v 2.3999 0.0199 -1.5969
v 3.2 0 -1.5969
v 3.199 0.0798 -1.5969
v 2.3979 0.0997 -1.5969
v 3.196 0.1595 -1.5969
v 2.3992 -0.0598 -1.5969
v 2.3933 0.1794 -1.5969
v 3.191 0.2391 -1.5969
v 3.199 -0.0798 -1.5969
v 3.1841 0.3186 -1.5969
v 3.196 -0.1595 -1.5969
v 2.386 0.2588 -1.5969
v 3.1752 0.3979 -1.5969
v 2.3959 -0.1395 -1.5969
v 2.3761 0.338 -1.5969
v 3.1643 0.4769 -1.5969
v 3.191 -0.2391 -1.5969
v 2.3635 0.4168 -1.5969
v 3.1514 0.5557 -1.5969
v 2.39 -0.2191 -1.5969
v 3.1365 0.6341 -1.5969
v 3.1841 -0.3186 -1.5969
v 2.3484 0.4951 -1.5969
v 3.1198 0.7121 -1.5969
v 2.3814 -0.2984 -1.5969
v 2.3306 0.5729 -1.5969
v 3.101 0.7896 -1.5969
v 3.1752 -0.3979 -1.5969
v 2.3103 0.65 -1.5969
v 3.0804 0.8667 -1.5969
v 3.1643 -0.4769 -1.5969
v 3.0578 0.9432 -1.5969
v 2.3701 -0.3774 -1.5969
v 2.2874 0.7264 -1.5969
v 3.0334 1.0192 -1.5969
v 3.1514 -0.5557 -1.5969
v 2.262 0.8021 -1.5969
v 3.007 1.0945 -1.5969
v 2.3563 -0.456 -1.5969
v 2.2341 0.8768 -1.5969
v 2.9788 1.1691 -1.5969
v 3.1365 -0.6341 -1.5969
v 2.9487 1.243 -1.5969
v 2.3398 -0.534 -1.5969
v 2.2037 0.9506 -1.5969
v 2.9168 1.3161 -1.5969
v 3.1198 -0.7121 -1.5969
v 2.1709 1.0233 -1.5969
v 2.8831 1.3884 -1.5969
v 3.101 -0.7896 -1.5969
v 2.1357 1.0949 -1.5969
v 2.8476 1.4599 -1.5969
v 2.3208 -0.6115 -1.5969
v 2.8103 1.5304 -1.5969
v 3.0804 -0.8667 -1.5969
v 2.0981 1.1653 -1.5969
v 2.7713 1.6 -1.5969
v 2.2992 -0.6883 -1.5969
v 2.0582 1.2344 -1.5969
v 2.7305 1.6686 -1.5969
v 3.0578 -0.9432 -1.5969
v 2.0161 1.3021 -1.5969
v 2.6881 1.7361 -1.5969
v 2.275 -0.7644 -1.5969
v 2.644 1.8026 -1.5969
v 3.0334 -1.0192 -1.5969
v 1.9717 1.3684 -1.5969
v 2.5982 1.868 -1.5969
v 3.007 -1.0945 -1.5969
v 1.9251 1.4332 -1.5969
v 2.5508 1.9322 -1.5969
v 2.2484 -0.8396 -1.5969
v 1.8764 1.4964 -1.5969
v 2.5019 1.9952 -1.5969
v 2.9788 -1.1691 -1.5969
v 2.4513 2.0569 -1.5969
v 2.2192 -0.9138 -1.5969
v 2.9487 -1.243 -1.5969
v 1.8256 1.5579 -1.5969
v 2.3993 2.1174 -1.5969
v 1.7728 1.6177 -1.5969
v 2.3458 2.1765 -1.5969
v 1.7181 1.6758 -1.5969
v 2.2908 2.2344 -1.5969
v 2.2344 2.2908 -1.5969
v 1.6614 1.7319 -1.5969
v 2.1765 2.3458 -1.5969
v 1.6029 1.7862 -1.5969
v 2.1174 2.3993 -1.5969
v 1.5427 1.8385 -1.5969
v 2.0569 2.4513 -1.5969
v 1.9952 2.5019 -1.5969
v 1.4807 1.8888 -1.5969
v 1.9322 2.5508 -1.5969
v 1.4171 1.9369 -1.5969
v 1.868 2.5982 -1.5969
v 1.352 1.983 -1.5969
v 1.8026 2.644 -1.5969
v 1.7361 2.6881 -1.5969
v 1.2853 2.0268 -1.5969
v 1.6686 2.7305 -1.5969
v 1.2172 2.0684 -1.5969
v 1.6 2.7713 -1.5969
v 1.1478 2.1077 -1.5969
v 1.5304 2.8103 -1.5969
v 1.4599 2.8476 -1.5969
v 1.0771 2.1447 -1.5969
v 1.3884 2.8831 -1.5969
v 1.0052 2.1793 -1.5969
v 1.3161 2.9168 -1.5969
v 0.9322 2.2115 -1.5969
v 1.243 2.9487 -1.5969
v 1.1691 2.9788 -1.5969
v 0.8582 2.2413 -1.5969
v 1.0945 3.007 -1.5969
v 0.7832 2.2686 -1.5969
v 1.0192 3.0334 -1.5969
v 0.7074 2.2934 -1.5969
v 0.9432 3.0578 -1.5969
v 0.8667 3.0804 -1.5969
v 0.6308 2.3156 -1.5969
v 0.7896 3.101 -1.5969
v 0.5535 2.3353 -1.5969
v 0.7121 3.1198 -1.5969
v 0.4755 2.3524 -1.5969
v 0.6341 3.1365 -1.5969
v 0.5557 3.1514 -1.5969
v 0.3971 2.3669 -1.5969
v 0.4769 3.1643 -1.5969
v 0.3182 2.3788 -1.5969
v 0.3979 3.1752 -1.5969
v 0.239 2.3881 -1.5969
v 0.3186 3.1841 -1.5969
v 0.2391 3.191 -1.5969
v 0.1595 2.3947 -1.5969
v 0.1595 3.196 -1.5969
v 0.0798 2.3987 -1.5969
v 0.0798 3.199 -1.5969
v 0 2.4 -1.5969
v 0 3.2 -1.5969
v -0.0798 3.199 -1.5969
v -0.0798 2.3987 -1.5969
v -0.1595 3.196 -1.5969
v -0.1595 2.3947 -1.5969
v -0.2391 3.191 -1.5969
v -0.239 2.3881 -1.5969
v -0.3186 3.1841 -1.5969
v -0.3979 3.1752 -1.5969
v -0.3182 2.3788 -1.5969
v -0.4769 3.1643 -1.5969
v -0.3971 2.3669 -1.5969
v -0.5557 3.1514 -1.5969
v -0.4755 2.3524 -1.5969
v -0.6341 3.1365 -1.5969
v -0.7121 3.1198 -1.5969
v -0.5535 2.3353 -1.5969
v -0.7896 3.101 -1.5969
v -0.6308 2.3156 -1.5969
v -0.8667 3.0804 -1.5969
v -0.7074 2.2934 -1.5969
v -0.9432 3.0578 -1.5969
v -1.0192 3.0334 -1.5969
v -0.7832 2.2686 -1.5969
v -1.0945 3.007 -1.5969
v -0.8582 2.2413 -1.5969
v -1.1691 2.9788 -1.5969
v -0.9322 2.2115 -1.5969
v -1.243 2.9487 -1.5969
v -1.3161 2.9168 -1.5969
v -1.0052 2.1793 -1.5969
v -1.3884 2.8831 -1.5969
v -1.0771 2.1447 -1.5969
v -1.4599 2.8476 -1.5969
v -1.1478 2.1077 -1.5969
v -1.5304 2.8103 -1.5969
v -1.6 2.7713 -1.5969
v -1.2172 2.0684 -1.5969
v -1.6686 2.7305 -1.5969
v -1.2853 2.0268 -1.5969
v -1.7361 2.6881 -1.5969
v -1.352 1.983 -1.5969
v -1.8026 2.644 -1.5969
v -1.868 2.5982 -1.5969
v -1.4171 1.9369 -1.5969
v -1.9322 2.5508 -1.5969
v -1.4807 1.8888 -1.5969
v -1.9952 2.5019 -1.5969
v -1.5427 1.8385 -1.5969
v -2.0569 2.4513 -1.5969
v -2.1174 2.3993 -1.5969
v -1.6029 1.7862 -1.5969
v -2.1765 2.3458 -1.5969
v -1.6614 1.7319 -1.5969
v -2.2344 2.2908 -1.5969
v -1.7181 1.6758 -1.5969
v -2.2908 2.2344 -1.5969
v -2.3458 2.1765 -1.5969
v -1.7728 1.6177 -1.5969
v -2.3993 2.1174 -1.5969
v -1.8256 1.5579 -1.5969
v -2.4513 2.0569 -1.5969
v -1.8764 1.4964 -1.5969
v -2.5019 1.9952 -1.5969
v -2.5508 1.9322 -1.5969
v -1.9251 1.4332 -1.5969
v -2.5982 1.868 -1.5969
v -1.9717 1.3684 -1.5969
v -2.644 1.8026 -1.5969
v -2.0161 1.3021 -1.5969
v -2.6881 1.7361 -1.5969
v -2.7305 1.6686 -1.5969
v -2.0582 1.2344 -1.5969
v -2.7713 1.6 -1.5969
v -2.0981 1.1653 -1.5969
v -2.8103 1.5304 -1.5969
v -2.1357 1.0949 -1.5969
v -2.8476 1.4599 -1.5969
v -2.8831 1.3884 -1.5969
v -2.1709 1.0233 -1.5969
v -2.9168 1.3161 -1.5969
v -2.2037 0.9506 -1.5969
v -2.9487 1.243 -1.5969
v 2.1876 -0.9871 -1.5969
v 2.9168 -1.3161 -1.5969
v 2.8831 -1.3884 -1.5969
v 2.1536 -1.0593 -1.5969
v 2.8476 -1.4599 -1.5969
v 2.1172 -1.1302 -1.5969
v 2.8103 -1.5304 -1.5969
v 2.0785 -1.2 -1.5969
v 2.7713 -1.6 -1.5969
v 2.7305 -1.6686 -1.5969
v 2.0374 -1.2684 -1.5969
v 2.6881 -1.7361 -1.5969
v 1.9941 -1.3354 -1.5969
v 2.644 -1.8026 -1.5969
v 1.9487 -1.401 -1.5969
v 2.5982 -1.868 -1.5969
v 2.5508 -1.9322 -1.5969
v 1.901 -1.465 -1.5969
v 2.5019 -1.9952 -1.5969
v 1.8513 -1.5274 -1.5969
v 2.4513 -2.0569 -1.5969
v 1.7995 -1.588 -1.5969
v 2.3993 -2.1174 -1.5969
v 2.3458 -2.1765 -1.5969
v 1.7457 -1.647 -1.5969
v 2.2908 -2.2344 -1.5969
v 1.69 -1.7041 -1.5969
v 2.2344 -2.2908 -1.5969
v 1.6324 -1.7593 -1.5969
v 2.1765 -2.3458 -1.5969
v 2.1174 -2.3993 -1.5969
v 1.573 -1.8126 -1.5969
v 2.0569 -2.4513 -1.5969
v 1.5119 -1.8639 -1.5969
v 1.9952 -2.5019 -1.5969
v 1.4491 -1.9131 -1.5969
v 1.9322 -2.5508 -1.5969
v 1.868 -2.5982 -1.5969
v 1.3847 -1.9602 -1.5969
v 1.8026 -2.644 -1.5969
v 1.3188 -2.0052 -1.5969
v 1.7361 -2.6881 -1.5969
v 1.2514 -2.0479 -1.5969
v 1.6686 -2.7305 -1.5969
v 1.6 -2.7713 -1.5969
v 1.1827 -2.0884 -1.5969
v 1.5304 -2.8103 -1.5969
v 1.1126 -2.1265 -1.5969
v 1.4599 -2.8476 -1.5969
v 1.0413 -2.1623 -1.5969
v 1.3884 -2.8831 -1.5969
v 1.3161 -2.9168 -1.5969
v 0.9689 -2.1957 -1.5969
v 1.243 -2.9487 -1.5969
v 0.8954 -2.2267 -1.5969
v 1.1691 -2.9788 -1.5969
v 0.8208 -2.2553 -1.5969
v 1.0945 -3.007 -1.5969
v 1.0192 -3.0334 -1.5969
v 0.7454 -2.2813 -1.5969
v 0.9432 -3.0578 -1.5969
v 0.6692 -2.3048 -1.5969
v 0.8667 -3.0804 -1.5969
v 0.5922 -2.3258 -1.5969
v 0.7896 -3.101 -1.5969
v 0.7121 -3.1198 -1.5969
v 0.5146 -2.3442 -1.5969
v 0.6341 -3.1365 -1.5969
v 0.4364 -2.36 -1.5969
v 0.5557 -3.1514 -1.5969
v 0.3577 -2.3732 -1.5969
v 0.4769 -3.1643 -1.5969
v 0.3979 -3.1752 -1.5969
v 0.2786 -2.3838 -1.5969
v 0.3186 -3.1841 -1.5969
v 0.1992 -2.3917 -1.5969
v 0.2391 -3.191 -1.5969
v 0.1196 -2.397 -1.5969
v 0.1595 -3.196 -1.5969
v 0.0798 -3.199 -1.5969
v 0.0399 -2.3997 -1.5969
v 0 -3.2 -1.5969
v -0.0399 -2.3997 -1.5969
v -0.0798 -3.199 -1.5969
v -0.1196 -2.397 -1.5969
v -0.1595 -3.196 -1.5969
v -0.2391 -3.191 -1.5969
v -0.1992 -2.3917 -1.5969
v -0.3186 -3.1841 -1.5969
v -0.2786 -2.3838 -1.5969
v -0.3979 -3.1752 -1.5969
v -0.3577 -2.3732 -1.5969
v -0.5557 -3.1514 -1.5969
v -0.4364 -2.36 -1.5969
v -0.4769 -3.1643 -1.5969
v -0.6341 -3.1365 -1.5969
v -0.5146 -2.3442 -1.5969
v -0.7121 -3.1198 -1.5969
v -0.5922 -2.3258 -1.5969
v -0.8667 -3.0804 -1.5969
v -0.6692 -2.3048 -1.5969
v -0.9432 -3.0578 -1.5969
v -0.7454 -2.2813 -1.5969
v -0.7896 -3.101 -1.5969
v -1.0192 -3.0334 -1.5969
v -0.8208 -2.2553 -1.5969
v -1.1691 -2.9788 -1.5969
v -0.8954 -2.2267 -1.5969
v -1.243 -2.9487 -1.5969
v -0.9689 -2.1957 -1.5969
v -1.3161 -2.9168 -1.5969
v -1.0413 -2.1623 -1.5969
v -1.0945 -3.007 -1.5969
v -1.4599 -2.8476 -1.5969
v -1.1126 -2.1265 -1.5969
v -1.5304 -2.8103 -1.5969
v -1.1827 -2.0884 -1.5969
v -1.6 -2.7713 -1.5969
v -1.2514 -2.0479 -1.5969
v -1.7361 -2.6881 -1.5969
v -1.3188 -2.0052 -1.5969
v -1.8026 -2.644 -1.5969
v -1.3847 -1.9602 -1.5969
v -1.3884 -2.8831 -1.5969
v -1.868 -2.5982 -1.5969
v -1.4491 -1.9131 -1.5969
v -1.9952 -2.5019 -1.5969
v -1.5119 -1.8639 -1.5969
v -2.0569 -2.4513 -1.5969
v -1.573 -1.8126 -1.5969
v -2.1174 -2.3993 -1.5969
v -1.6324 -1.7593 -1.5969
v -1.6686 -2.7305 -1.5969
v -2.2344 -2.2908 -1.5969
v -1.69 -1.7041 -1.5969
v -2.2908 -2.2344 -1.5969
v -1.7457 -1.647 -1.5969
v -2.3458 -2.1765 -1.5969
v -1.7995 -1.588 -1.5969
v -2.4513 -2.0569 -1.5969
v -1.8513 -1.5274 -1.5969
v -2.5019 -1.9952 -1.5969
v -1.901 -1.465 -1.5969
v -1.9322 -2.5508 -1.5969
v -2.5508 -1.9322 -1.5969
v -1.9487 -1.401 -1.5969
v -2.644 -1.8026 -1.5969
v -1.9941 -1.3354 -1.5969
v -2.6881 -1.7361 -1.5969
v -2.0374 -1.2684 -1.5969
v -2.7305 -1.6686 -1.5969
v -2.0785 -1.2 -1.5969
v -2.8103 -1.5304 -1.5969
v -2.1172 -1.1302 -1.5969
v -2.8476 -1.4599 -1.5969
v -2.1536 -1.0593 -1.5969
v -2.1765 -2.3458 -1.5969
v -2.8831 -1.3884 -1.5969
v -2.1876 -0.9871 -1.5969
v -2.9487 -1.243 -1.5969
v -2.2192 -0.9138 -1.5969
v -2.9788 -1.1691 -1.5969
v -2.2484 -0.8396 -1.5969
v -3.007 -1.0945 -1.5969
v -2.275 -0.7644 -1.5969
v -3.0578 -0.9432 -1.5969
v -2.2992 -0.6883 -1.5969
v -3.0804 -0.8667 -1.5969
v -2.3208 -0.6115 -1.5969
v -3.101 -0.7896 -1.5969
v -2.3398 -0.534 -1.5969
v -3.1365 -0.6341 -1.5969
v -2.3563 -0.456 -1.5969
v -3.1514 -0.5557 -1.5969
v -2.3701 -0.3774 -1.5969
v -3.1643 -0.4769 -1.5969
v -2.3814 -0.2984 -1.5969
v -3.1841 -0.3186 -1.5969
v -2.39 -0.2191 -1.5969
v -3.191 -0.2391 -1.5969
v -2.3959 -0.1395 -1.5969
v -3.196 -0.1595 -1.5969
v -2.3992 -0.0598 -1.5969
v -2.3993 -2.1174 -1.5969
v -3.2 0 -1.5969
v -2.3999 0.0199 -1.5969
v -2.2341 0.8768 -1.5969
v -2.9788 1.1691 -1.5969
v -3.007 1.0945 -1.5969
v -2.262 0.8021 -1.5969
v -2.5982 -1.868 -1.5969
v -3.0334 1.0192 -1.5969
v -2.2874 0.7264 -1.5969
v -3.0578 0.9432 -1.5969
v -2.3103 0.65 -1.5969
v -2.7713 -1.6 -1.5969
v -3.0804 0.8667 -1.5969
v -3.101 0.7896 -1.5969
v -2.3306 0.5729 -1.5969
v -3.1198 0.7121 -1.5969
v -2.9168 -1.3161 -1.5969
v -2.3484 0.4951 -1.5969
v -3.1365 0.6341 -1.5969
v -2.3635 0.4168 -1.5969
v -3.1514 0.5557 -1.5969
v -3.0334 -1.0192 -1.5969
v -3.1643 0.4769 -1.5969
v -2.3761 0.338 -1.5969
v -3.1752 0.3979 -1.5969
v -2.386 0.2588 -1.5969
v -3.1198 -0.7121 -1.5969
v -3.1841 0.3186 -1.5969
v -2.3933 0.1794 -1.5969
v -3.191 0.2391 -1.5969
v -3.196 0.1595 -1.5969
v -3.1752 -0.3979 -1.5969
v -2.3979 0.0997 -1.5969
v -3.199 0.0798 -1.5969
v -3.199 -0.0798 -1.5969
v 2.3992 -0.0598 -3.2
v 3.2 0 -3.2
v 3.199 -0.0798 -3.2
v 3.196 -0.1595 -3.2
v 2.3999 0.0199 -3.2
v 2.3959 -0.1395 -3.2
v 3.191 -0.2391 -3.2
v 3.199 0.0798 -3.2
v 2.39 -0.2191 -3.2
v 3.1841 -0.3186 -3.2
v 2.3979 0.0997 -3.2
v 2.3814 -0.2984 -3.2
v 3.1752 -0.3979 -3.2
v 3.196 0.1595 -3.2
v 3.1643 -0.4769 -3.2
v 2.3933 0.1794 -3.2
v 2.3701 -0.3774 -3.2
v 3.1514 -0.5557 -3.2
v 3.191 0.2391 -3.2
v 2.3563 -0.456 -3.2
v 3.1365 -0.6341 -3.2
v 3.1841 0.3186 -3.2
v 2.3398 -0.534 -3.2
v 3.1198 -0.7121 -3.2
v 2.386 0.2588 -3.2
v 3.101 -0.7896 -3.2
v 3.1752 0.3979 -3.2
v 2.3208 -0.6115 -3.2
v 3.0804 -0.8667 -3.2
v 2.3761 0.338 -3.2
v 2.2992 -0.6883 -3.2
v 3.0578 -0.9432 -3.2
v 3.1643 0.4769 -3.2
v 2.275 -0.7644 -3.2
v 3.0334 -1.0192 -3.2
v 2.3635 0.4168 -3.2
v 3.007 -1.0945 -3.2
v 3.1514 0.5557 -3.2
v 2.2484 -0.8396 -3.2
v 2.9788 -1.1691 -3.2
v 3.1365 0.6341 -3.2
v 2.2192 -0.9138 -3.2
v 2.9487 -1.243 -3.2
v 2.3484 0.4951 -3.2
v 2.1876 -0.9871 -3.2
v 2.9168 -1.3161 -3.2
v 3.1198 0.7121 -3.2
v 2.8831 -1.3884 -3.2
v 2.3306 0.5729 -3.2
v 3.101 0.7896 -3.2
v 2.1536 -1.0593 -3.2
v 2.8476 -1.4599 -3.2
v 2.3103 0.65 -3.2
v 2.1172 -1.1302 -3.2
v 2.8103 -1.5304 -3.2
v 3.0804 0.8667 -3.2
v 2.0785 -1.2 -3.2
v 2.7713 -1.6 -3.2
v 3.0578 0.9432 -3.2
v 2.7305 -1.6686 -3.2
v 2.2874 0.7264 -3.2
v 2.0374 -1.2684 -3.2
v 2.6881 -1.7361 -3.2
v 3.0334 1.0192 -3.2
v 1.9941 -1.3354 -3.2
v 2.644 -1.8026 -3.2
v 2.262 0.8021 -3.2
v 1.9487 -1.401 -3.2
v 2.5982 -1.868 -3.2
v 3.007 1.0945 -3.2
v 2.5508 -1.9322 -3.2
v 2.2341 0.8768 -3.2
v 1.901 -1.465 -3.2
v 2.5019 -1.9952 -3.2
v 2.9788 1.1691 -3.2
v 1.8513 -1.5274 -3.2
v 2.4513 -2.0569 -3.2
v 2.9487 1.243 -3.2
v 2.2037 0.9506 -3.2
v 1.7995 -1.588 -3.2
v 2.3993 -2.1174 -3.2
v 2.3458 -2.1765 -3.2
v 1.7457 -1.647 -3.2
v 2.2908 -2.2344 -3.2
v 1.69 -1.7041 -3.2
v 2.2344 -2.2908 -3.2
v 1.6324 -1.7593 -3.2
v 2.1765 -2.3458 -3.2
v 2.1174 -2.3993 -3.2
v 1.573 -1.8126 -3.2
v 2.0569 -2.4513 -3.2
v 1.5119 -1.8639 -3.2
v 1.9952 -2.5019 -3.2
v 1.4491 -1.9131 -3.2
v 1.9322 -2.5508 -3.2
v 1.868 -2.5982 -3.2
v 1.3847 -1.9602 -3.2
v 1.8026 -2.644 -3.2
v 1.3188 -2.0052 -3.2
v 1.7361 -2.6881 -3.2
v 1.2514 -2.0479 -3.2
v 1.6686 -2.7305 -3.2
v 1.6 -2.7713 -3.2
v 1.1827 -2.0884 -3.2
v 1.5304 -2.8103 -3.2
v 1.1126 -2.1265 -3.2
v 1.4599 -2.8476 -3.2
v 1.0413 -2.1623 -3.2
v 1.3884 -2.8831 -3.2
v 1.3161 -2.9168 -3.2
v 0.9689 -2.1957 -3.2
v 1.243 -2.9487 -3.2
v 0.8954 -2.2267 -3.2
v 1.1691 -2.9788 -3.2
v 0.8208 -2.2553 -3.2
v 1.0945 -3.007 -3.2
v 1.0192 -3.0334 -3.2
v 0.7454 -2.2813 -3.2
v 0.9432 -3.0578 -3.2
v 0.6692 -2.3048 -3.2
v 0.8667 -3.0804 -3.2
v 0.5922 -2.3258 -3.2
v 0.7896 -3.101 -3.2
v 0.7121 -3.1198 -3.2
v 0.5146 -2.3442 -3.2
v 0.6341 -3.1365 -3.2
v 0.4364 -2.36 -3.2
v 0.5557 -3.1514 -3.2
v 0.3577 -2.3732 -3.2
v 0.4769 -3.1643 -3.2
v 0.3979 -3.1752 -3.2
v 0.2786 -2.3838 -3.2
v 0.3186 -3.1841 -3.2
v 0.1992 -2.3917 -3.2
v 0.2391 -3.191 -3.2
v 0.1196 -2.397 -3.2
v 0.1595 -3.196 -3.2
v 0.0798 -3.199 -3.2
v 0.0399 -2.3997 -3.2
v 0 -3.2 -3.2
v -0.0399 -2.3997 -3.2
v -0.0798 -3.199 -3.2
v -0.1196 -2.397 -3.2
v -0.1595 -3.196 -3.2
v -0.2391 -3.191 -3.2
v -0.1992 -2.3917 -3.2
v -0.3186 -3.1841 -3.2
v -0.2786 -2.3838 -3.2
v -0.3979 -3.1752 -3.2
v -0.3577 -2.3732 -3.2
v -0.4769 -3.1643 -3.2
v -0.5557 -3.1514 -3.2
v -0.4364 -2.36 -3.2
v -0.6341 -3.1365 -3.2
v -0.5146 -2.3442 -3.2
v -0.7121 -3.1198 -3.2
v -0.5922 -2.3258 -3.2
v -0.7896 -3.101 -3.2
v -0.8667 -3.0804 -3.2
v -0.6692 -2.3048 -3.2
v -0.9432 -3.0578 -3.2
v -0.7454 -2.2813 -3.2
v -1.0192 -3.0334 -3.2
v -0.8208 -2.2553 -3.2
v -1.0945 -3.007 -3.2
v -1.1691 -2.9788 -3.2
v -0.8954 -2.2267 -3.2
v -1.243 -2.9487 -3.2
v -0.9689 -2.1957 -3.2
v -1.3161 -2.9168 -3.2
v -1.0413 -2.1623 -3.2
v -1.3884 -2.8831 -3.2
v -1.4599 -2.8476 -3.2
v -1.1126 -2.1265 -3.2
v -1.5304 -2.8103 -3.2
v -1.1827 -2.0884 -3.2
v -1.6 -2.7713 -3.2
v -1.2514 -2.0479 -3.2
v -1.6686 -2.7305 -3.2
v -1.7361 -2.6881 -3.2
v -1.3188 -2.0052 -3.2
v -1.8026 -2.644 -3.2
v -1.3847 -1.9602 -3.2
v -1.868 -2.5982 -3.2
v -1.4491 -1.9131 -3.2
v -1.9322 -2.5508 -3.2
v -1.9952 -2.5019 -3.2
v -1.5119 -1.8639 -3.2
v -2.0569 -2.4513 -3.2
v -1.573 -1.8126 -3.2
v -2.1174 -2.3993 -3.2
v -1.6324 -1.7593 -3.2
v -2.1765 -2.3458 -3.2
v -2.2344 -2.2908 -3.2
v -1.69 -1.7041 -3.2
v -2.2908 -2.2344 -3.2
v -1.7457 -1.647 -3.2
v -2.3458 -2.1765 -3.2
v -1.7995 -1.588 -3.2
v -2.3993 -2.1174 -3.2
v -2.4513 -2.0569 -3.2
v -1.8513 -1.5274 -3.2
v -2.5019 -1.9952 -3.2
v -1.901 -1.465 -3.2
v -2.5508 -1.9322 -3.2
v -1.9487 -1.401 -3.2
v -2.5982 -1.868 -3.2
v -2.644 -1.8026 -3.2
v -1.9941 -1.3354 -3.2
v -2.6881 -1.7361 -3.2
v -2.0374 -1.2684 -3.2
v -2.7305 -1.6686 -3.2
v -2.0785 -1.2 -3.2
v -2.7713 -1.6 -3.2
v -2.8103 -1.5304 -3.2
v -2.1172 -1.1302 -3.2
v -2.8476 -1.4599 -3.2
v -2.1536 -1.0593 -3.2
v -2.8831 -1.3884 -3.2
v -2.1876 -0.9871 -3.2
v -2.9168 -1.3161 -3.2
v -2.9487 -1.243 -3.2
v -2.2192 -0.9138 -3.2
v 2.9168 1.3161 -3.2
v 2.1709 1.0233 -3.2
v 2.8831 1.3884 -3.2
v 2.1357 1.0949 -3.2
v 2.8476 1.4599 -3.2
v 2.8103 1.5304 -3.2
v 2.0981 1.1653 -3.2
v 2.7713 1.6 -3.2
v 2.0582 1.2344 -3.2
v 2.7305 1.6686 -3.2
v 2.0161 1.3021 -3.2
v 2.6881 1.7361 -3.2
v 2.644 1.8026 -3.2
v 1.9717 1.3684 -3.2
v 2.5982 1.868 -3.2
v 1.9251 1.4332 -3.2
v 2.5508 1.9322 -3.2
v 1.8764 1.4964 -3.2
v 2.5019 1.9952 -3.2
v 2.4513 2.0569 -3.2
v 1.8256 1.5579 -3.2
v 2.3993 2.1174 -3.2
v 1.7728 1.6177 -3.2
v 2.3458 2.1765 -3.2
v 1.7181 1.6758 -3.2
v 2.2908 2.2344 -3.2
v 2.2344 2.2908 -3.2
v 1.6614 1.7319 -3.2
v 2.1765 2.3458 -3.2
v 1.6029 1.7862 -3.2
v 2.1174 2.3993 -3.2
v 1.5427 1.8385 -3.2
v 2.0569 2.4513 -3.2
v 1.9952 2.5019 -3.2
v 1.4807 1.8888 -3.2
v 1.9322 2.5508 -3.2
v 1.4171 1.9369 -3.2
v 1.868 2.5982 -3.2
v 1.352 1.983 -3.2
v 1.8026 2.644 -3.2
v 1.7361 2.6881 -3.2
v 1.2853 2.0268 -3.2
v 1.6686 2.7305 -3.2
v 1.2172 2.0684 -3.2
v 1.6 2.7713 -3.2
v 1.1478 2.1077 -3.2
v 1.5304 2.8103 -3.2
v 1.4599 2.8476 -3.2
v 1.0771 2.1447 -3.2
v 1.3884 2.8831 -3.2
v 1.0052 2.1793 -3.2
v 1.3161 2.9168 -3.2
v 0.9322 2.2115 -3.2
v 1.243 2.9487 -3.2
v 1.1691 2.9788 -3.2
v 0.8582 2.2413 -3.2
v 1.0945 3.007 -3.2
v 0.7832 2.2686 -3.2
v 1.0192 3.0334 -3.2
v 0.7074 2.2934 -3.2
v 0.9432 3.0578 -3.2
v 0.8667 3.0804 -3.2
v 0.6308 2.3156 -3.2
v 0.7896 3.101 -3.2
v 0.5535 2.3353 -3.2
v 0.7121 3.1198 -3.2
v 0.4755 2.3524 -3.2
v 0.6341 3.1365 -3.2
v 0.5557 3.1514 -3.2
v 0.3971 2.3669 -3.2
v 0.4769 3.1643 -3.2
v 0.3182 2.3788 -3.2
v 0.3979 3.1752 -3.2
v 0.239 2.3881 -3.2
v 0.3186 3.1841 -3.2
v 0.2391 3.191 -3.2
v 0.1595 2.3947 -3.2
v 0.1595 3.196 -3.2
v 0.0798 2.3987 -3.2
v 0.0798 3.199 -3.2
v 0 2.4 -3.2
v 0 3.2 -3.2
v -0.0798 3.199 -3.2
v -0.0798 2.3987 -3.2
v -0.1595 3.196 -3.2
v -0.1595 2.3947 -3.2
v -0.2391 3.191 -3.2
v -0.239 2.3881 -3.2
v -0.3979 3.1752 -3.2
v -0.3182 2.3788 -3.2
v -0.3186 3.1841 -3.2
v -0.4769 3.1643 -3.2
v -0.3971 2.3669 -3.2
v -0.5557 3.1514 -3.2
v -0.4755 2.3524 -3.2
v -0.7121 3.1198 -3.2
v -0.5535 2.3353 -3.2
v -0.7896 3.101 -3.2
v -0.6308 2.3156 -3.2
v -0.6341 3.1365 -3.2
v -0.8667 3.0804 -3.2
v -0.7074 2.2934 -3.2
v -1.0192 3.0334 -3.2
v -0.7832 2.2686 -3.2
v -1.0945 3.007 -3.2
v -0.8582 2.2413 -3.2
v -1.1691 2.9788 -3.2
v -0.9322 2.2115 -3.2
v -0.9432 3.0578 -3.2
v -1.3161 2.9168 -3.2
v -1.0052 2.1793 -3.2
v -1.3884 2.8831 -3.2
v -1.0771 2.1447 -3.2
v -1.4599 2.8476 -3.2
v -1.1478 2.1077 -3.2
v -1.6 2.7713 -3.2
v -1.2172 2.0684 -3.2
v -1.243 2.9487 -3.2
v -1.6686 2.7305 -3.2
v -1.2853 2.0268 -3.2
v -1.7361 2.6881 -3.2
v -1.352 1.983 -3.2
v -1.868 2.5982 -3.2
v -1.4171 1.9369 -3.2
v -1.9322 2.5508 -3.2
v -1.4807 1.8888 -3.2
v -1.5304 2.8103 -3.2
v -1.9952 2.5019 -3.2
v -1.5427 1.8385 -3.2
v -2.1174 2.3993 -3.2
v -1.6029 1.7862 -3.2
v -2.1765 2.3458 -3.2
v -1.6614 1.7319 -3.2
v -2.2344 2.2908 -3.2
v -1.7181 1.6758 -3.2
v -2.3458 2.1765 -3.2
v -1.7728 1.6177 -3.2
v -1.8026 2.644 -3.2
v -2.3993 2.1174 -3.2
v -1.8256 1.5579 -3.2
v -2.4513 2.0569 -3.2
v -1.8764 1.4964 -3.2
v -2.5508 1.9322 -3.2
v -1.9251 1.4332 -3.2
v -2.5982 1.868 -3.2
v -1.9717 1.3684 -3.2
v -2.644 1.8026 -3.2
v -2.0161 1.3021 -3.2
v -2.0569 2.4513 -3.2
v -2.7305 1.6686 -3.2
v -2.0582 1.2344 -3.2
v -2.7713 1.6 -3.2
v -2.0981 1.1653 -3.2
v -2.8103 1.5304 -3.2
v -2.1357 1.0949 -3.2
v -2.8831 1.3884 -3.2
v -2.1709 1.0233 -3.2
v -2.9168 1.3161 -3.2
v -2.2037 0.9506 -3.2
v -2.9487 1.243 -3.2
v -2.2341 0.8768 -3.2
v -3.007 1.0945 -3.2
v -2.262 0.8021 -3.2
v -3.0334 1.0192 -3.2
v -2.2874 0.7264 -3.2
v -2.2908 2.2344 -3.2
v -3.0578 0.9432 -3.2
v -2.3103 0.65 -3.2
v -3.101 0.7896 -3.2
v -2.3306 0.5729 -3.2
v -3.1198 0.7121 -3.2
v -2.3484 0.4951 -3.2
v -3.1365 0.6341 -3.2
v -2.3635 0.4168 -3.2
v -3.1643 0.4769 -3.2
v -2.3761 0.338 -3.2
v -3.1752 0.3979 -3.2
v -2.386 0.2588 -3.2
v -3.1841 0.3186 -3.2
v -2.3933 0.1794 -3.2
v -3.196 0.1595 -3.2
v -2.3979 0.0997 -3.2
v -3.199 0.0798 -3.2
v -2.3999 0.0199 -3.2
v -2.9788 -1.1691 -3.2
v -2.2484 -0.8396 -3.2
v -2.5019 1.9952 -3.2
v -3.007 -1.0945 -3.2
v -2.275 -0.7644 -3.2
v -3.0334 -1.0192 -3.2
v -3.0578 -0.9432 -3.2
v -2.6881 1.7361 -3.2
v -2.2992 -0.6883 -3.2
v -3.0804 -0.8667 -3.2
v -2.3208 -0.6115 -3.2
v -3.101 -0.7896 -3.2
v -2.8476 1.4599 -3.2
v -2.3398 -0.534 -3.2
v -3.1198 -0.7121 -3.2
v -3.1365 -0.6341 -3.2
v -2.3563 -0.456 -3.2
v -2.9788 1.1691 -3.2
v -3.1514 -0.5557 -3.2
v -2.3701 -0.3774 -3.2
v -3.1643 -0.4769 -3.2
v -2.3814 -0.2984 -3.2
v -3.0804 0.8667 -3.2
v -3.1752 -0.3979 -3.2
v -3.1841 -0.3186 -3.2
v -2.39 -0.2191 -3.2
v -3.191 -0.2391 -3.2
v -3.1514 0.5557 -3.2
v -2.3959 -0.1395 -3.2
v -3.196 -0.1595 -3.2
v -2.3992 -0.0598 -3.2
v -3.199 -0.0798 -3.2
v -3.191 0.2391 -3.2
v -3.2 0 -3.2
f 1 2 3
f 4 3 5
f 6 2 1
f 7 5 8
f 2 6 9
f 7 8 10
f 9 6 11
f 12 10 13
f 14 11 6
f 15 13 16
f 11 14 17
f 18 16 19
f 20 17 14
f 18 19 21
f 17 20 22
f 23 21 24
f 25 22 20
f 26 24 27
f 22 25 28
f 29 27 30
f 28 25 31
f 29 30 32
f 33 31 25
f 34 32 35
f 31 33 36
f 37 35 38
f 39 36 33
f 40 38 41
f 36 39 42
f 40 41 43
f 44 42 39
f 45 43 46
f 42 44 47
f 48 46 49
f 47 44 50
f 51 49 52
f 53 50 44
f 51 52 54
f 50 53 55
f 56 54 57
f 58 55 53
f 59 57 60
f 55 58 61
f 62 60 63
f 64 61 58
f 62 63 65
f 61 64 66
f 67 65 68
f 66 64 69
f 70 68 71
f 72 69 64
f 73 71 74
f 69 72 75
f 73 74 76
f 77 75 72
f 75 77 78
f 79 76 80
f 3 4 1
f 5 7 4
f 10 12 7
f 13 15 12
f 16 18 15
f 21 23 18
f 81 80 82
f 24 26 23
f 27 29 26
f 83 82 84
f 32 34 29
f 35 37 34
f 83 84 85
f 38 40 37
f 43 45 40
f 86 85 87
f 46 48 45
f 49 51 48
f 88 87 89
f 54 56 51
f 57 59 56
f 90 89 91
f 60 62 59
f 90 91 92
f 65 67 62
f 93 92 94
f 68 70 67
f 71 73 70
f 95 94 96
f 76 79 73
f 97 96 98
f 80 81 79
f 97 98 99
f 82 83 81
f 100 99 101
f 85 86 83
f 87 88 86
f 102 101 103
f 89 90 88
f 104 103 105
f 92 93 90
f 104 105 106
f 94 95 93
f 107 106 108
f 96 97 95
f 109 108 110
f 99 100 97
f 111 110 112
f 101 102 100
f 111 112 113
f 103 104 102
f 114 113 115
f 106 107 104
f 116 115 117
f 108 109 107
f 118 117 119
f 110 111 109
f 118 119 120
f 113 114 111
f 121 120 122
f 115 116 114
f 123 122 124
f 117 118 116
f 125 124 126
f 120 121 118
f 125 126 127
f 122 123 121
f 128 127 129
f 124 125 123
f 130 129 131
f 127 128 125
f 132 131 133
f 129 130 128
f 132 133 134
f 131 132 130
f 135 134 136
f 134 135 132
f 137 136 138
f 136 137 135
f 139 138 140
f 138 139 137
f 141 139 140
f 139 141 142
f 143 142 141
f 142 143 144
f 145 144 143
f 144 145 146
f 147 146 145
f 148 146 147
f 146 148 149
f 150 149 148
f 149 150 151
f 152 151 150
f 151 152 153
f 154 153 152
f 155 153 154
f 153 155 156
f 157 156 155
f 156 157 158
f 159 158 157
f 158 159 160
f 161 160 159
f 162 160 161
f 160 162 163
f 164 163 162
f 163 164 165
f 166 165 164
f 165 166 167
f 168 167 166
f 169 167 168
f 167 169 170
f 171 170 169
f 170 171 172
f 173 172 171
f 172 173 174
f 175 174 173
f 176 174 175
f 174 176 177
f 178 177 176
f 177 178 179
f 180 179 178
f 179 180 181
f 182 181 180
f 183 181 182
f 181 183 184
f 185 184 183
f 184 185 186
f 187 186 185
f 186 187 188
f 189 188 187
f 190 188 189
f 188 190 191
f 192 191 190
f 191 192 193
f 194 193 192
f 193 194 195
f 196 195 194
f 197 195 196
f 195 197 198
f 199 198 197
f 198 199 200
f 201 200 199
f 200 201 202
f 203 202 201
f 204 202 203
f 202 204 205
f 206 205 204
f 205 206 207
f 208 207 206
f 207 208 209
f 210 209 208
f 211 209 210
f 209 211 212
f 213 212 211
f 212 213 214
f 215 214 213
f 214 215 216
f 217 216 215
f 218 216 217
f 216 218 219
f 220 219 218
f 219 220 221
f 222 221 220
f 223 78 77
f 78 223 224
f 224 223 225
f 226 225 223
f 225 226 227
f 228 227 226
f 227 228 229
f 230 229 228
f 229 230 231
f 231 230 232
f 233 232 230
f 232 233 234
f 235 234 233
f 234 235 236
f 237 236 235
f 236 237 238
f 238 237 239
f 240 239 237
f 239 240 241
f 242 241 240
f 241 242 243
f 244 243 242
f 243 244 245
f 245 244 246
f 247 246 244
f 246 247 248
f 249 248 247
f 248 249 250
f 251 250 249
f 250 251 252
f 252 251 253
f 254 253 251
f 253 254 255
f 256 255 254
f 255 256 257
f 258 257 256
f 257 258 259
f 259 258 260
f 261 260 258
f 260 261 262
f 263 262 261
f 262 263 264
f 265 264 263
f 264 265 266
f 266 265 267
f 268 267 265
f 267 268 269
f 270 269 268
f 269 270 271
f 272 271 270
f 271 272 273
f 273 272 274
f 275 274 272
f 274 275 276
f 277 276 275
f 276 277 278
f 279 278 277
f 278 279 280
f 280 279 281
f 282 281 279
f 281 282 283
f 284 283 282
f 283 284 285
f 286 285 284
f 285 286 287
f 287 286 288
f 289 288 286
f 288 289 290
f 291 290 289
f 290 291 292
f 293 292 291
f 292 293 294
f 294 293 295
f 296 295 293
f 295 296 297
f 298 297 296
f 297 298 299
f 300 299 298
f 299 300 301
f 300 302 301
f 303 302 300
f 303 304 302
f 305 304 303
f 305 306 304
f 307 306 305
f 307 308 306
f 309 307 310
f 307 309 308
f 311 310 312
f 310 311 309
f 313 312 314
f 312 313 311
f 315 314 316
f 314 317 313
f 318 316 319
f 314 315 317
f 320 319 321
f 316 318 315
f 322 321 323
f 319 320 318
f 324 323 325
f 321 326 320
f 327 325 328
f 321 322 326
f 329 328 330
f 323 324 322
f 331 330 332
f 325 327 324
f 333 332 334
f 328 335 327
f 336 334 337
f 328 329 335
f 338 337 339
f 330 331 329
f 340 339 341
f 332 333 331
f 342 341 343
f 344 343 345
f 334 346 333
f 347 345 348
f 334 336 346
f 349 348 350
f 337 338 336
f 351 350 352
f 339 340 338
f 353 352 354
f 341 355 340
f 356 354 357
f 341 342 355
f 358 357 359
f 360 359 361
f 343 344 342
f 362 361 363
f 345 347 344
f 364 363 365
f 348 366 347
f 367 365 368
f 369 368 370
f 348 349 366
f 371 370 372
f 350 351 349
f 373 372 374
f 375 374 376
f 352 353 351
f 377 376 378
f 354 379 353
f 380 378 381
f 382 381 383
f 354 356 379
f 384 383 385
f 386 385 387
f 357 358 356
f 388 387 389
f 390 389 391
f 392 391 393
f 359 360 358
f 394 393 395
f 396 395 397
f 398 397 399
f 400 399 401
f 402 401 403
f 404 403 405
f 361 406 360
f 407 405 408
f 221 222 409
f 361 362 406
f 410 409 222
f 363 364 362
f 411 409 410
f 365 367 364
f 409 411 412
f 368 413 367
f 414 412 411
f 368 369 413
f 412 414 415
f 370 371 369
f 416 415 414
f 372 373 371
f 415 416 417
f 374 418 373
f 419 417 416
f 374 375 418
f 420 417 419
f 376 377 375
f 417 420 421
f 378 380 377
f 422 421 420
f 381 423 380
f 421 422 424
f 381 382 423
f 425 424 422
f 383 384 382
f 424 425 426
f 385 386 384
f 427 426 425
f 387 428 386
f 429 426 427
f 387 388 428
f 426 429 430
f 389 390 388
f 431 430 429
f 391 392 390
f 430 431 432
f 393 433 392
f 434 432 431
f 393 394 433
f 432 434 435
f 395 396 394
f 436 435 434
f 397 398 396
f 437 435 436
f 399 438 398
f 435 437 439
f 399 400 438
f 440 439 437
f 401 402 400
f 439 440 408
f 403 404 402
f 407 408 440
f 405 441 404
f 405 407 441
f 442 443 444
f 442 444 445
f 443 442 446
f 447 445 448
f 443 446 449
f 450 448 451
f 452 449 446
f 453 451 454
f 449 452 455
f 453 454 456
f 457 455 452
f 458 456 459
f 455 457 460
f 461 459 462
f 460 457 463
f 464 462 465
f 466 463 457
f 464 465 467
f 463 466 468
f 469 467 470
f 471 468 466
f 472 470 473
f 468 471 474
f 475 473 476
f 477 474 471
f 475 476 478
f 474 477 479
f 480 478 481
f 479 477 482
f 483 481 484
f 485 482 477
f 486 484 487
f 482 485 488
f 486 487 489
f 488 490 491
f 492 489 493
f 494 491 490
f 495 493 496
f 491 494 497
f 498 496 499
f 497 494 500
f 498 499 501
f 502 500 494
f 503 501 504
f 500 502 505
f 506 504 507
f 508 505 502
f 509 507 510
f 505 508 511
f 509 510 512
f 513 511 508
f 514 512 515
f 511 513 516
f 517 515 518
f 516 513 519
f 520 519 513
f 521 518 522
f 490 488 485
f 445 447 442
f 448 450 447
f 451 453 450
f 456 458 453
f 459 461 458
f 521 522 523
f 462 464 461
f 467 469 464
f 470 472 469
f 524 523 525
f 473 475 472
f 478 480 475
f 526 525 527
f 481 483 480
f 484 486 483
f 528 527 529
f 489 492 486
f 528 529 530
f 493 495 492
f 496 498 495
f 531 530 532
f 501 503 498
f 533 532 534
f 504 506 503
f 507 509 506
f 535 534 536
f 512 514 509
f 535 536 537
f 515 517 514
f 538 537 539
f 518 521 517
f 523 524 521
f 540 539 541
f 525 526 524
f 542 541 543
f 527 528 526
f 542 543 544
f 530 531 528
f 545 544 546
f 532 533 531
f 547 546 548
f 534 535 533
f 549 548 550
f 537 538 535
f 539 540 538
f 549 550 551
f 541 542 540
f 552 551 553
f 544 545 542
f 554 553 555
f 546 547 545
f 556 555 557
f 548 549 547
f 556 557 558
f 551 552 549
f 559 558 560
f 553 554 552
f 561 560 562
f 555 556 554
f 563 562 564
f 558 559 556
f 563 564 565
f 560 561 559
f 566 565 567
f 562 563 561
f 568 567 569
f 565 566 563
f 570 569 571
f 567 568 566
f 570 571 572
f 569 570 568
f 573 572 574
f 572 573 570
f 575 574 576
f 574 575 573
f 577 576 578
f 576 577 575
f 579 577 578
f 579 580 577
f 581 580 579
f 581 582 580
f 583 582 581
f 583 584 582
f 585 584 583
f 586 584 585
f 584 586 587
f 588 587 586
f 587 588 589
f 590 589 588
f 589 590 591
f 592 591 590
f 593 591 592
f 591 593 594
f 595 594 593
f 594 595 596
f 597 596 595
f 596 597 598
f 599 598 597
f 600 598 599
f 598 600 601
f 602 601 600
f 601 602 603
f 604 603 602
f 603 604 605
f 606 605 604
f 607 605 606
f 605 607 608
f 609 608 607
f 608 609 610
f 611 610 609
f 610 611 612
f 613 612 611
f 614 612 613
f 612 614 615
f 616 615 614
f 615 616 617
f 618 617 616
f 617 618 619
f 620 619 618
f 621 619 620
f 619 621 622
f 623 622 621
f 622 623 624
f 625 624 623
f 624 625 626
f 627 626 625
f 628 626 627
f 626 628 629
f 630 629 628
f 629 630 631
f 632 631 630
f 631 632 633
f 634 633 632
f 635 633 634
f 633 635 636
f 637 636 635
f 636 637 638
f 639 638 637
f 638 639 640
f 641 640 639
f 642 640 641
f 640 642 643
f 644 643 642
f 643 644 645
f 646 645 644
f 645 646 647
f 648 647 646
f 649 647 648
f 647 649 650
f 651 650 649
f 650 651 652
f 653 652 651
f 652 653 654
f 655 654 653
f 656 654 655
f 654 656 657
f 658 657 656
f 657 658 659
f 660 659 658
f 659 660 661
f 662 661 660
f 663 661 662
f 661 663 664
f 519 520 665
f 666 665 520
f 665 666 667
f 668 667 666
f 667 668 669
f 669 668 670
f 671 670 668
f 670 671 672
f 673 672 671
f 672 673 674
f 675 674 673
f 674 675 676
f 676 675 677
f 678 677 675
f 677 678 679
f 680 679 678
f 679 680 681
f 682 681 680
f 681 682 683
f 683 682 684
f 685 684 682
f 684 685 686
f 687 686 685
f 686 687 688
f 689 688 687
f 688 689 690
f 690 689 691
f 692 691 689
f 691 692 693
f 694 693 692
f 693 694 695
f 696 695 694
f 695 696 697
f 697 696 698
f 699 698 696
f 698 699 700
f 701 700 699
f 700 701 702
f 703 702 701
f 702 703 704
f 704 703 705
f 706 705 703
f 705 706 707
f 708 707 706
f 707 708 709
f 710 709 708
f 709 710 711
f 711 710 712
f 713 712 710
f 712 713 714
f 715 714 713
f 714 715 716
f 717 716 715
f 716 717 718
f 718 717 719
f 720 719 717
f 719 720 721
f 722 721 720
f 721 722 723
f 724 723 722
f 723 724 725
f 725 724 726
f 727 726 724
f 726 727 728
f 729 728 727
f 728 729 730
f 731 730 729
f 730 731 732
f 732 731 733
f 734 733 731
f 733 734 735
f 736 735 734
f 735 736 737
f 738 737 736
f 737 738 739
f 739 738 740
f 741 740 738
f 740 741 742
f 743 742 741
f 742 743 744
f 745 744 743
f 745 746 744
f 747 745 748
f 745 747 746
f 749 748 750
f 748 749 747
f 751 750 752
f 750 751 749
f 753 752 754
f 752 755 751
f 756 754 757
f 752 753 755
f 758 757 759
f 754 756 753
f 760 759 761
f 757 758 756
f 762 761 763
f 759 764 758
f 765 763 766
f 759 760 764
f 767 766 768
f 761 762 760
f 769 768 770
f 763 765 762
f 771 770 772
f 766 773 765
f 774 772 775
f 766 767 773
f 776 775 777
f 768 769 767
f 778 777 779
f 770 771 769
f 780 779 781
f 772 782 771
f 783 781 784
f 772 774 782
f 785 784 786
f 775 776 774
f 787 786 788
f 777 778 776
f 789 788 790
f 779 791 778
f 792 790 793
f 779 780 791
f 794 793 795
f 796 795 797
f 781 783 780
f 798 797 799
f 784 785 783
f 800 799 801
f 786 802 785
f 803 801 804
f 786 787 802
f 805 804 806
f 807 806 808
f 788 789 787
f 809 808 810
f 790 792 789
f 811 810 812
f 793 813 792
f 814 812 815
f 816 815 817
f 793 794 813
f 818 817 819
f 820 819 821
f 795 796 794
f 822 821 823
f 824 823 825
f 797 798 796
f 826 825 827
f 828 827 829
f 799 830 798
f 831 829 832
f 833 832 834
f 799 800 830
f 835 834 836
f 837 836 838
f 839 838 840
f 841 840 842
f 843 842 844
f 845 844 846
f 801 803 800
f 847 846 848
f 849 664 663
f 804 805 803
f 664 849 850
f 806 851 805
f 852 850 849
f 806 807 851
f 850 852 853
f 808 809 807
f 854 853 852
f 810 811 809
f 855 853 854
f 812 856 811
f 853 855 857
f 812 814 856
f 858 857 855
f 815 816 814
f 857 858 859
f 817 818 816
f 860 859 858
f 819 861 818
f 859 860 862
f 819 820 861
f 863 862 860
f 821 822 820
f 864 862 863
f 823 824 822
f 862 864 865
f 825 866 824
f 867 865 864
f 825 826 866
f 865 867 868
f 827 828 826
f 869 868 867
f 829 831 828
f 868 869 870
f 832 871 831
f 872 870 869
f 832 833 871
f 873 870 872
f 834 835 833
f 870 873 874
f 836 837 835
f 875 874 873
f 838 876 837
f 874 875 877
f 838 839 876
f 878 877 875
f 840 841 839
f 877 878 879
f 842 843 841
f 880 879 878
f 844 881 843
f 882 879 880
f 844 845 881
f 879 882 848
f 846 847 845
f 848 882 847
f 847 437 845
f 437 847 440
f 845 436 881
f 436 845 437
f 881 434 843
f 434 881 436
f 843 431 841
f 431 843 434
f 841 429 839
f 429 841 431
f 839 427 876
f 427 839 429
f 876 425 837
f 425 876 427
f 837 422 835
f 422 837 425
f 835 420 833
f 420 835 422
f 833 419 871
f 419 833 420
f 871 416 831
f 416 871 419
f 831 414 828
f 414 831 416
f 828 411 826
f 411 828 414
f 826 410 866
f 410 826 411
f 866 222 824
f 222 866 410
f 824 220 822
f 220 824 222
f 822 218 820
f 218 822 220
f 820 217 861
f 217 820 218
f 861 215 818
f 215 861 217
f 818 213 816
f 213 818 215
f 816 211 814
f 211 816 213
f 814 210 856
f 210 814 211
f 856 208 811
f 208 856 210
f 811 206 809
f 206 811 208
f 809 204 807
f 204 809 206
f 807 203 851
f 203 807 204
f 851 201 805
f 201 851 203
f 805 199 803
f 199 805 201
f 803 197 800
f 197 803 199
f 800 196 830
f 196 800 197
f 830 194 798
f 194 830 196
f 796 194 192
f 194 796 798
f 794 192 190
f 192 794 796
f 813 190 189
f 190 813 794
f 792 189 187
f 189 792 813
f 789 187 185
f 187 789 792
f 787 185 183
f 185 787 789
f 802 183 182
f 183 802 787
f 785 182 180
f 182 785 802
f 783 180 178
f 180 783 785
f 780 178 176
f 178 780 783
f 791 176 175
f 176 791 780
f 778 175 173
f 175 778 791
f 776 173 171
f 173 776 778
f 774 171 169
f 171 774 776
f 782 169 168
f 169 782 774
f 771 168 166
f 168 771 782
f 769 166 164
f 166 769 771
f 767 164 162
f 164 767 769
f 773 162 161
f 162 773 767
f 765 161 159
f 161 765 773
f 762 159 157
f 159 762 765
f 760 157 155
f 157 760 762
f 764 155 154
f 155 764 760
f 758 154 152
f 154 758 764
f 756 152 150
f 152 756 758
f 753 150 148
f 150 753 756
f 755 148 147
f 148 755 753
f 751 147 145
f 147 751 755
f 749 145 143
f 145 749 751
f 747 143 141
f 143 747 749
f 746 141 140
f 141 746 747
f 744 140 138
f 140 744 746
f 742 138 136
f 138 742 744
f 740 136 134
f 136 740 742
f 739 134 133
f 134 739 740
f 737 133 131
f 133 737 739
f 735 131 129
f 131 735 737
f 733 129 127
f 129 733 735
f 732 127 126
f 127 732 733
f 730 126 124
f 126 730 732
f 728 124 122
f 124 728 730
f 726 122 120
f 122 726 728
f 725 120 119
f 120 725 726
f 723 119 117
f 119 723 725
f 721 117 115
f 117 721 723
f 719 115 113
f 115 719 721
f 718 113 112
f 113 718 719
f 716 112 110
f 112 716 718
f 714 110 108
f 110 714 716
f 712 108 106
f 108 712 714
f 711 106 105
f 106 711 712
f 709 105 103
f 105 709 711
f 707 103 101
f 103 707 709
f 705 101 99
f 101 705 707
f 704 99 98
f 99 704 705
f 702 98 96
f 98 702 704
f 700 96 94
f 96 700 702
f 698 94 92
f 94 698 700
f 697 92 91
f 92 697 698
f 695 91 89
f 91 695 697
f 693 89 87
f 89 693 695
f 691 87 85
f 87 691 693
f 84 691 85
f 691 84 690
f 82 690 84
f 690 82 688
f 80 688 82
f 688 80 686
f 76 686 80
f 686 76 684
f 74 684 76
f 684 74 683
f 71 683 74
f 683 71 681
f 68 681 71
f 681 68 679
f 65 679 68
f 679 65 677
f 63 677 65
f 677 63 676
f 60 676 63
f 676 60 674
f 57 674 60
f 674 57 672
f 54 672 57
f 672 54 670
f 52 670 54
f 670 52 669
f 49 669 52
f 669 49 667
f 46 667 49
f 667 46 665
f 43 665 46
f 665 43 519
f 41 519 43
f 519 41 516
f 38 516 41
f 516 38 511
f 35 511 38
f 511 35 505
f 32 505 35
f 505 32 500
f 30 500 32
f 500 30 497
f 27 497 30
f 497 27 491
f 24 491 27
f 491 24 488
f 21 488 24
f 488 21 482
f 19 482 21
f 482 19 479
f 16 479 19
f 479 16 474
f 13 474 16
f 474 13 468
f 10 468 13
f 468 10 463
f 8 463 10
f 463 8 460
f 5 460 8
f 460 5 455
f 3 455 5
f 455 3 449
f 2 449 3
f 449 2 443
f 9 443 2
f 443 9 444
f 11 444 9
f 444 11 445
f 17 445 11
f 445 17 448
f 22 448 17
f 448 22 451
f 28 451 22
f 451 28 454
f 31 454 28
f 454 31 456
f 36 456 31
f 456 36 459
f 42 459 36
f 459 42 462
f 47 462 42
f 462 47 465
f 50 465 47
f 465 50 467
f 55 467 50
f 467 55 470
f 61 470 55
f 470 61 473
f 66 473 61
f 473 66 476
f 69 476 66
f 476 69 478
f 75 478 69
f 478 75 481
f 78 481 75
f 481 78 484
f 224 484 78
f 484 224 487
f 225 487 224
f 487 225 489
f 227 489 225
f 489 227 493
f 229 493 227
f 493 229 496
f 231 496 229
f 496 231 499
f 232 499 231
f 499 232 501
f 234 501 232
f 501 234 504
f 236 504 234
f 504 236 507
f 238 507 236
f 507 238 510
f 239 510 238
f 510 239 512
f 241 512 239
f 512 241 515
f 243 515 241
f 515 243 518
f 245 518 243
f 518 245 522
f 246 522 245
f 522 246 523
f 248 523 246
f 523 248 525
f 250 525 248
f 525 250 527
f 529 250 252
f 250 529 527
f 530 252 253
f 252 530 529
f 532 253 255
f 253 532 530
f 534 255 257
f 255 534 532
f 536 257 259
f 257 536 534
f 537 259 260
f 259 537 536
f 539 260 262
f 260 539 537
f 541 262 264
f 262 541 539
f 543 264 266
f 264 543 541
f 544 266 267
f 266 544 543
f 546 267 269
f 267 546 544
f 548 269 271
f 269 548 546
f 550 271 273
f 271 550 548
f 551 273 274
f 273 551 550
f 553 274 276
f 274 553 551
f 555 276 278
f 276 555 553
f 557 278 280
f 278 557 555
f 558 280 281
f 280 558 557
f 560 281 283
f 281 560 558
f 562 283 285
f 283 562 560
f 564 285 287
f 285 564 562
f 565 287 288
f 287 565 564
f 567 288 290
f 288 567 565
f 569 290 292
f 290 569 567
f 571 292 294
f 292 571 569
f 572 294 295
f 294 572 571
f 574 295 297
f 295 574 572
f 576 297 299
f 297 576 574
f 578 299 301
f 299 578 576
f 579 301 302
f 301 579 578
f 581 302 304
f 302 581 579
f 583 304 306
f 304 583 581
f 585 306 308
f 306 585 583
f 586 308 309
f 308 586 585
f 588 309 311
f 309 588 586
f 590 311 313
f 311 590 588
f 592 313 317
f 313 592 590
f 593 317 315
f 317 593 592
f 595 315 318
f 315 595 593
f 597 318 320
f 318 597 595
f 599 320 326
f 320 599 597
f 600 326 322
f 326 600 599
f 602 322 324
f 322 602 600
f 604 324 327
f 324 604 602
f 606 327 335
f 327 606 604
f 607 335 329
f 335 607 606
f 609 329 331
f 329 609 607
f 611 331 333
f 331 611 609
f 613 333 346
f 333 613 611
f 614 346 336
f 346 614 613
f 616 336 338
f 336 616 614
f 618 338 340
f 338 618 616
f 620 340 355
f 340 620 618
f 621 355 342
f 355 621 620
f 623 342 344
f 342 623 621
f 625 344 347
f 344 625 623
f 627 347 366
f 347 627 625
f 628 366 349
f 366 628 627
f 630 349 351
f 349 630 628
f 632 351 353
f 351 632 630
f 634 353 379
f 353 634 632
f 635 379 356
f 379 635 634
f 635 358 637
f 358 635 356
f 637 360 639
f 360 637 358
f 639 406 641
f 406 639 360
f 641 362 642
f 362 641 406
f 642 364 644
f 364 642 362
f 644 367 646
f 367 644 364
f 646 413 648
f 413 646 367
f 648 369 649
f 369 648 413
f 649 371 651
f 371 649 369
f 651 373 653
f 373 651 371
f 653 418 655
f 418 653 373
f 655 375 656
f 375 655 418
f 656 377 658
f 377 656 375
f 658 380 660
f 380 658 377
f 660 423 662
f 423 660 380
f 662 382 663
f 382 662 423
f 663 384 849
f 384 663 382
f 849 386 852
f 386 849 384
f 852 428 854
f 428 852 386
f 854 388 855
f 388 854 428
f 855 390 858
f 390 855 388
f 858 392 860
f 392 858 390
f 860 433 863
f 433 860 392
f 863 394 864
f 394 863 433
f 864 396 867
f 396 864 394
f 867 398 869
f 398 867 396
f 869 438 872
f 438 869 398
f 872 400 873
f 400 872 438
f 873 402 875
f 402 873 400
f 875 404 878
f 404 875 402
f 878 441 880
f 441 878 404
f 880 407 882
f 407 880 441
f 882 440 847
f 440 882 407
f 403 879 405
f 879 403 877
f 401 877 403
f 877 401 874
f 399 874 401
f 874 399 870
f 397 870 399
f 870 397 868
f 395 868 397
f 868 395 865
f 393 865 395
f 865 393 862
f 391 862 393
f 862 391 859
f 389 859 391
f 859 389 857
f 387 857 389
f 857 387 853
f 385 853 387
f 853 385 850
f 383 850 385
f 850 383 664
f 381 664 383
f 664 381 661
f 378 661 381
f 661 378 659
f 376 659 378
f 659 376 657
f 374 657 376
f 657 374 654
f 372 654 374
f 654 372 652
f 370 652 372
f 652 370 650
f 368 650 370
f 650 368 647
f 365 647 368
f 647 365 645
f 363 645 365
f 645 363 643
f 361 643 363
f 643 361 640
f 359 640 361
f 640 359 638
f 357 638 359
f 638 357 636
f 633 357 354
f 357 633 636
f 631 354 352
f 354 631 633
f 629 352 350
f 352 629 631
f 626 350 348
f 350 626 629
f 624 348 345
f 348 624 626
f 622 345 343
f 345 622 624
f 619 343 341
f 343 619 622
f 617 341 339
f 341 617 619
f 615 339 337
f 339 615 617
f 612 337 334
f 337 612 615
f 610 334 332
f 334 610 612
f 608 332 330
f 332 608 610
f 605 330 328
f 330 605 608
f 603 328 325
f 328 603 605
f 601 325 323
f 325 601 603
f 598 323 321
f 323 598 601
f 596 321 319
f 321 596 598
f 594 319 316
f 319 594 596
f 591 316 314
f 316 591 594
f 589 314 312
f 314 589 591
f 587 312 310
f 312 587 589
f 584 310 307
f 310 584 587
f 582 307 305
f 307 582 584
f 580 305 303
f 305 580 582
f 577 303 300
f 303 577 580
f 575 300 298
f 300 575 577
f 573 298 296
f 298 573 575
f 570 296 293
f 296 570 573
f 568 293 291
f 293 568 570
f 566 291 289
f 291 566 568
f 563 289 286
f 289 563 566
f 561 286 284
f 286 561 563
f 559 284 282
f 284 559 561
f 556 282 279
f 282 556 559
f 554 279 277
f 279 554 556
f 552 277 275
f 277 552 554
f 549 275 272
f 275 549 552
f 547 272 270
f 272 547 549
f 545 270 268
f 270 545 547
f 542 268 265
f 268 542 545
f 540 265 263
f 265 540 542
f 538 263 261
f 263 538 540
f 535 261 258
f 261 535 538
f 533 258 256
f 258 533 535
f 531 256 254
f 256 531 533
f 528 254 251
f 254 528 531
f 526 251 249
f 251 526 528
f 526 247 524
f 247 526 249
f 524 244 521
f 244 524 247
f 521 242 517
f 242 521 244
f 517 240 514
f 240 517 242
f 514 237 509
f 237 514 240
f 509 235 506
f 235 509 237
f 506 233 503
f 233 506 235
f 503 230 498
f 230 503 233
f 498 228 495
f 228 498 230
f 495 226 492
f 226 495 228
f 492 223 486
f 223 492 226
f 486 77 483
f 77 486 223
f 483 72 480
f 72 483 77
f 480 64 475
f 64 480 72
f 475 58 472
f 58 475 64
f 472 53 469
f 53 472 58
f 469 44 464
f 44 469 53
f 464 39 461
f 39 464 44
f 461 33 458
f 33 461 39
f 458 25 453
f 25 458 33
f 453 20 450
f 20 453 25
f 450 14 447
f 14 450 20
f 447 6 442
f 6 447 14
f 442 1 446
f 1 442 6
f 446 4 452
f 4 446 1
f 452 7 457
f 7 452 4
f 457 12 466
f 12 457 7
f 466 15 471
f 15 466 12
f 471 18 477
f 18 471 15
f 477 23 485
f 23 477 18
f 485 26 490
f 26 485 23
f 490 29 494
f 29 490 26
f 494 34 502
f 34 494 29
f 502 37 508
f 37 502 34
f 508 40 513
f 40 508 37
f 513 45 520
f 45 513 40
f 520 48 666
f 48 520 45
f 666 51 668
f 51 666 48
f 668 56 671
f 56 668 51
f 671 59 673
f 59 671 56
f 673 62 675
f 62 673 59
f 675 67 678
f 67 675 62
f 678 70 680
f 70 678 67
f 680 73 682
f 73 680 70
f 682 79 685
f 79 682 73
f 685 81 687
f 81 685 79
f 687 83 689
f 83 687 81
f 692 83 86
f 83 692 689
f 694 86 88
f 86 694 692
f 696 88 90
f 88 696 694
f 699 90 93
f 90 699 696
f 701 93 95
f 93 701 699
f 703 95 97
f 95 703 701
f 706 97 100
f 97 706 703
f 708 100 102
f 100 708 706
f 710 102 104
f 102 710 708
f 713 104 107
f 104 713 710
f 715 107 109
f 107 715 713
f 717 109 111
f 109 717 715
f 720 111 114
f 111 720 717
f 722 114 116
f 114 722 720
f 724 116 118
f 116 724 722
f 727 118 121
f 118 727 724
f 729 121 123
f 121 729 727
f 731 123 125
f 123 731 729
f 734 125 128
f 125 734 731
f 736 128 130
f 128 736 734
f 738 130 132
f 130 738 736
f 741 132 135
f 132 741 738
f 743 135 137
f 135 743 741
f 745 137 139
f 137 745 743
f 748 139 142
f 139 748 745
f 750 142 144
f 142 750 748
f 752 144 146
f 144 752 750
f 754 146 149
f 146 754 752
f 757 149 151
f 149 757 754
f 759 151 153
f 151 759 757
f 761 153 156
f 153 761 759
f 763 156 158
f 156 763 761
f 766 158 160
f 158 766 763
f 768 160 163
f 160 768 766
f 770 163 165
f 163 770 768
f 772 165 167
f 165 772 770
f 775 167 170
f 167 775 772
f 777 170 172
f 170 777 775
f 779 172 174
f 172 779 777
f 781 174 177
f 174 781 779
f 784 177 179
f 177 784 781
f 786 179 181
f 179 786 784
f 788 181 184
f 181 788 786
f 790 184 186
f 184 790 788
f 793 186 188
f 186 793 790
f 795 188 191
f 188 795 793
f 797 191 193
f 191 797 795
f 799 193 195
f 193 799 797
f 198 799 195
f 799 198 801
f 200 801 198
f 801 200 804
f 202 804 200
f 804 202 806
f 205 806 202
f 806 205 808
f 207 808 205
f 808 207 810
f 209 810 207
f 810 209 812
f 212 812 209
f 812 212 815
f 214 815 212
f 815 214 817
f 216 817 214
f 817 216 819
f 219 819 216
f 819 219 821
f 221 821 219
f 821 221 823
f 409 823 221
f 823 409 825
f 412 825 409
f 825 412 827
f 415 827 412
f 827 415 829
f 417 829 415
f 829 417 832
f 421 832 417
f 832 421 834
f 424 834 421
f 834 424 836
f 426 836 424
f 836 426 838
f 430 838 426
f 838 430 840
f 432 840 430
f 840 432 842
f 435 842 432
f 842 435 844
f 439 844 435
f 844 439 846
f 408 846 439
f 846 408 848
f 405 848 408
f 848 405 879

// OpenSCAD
use <../lib.scad>
use <42291.scad>
$fa=1; $fs=0.2;
function ldraw_lib__30294(realsolid=false) = [
// 0 =Rock  4 x  4 x  1.667 Bottom
// 0 Name: 30294.dat
// 0 Author: [PTadmin]
// 0 !LDRAW_ORG Part Alias UPDATE 2013-02
// 0 !LICENSE Licensed under CC BY 4.0 : see CAreadme.txt
// 
// 0 BFC CERTIFY CW
  [0,"BFC","CERTIFY"],
  [0,"BFC","CW"],
// 
// 0 !HISTORY 2013-12-23 [PTadmin] Official Update 2013-02
// 
// 
// 0 // Alias of 42291
// 0 // 30294 is the transparent colour counterpart of 42291
// 
// 1 16 0 0 0 1 0 0 0 1 0 0 0 1 42291.dat
  [1,16,0,0,0,1,0,0,0,1,0,0,0,1, ldraw_lib__42291(realsolid)],
// 0
];
module ldraw_lib__30294(step=0, col=false, unit=2/5, alt=false, line=0.2, solid=!$preview)
    makepoly(ldraw_lib__30294(solid), step=step, col=col, unit=unit, alt=alt, line=line, solid=solid);
ldraw_lib__30294(line=0.2);
